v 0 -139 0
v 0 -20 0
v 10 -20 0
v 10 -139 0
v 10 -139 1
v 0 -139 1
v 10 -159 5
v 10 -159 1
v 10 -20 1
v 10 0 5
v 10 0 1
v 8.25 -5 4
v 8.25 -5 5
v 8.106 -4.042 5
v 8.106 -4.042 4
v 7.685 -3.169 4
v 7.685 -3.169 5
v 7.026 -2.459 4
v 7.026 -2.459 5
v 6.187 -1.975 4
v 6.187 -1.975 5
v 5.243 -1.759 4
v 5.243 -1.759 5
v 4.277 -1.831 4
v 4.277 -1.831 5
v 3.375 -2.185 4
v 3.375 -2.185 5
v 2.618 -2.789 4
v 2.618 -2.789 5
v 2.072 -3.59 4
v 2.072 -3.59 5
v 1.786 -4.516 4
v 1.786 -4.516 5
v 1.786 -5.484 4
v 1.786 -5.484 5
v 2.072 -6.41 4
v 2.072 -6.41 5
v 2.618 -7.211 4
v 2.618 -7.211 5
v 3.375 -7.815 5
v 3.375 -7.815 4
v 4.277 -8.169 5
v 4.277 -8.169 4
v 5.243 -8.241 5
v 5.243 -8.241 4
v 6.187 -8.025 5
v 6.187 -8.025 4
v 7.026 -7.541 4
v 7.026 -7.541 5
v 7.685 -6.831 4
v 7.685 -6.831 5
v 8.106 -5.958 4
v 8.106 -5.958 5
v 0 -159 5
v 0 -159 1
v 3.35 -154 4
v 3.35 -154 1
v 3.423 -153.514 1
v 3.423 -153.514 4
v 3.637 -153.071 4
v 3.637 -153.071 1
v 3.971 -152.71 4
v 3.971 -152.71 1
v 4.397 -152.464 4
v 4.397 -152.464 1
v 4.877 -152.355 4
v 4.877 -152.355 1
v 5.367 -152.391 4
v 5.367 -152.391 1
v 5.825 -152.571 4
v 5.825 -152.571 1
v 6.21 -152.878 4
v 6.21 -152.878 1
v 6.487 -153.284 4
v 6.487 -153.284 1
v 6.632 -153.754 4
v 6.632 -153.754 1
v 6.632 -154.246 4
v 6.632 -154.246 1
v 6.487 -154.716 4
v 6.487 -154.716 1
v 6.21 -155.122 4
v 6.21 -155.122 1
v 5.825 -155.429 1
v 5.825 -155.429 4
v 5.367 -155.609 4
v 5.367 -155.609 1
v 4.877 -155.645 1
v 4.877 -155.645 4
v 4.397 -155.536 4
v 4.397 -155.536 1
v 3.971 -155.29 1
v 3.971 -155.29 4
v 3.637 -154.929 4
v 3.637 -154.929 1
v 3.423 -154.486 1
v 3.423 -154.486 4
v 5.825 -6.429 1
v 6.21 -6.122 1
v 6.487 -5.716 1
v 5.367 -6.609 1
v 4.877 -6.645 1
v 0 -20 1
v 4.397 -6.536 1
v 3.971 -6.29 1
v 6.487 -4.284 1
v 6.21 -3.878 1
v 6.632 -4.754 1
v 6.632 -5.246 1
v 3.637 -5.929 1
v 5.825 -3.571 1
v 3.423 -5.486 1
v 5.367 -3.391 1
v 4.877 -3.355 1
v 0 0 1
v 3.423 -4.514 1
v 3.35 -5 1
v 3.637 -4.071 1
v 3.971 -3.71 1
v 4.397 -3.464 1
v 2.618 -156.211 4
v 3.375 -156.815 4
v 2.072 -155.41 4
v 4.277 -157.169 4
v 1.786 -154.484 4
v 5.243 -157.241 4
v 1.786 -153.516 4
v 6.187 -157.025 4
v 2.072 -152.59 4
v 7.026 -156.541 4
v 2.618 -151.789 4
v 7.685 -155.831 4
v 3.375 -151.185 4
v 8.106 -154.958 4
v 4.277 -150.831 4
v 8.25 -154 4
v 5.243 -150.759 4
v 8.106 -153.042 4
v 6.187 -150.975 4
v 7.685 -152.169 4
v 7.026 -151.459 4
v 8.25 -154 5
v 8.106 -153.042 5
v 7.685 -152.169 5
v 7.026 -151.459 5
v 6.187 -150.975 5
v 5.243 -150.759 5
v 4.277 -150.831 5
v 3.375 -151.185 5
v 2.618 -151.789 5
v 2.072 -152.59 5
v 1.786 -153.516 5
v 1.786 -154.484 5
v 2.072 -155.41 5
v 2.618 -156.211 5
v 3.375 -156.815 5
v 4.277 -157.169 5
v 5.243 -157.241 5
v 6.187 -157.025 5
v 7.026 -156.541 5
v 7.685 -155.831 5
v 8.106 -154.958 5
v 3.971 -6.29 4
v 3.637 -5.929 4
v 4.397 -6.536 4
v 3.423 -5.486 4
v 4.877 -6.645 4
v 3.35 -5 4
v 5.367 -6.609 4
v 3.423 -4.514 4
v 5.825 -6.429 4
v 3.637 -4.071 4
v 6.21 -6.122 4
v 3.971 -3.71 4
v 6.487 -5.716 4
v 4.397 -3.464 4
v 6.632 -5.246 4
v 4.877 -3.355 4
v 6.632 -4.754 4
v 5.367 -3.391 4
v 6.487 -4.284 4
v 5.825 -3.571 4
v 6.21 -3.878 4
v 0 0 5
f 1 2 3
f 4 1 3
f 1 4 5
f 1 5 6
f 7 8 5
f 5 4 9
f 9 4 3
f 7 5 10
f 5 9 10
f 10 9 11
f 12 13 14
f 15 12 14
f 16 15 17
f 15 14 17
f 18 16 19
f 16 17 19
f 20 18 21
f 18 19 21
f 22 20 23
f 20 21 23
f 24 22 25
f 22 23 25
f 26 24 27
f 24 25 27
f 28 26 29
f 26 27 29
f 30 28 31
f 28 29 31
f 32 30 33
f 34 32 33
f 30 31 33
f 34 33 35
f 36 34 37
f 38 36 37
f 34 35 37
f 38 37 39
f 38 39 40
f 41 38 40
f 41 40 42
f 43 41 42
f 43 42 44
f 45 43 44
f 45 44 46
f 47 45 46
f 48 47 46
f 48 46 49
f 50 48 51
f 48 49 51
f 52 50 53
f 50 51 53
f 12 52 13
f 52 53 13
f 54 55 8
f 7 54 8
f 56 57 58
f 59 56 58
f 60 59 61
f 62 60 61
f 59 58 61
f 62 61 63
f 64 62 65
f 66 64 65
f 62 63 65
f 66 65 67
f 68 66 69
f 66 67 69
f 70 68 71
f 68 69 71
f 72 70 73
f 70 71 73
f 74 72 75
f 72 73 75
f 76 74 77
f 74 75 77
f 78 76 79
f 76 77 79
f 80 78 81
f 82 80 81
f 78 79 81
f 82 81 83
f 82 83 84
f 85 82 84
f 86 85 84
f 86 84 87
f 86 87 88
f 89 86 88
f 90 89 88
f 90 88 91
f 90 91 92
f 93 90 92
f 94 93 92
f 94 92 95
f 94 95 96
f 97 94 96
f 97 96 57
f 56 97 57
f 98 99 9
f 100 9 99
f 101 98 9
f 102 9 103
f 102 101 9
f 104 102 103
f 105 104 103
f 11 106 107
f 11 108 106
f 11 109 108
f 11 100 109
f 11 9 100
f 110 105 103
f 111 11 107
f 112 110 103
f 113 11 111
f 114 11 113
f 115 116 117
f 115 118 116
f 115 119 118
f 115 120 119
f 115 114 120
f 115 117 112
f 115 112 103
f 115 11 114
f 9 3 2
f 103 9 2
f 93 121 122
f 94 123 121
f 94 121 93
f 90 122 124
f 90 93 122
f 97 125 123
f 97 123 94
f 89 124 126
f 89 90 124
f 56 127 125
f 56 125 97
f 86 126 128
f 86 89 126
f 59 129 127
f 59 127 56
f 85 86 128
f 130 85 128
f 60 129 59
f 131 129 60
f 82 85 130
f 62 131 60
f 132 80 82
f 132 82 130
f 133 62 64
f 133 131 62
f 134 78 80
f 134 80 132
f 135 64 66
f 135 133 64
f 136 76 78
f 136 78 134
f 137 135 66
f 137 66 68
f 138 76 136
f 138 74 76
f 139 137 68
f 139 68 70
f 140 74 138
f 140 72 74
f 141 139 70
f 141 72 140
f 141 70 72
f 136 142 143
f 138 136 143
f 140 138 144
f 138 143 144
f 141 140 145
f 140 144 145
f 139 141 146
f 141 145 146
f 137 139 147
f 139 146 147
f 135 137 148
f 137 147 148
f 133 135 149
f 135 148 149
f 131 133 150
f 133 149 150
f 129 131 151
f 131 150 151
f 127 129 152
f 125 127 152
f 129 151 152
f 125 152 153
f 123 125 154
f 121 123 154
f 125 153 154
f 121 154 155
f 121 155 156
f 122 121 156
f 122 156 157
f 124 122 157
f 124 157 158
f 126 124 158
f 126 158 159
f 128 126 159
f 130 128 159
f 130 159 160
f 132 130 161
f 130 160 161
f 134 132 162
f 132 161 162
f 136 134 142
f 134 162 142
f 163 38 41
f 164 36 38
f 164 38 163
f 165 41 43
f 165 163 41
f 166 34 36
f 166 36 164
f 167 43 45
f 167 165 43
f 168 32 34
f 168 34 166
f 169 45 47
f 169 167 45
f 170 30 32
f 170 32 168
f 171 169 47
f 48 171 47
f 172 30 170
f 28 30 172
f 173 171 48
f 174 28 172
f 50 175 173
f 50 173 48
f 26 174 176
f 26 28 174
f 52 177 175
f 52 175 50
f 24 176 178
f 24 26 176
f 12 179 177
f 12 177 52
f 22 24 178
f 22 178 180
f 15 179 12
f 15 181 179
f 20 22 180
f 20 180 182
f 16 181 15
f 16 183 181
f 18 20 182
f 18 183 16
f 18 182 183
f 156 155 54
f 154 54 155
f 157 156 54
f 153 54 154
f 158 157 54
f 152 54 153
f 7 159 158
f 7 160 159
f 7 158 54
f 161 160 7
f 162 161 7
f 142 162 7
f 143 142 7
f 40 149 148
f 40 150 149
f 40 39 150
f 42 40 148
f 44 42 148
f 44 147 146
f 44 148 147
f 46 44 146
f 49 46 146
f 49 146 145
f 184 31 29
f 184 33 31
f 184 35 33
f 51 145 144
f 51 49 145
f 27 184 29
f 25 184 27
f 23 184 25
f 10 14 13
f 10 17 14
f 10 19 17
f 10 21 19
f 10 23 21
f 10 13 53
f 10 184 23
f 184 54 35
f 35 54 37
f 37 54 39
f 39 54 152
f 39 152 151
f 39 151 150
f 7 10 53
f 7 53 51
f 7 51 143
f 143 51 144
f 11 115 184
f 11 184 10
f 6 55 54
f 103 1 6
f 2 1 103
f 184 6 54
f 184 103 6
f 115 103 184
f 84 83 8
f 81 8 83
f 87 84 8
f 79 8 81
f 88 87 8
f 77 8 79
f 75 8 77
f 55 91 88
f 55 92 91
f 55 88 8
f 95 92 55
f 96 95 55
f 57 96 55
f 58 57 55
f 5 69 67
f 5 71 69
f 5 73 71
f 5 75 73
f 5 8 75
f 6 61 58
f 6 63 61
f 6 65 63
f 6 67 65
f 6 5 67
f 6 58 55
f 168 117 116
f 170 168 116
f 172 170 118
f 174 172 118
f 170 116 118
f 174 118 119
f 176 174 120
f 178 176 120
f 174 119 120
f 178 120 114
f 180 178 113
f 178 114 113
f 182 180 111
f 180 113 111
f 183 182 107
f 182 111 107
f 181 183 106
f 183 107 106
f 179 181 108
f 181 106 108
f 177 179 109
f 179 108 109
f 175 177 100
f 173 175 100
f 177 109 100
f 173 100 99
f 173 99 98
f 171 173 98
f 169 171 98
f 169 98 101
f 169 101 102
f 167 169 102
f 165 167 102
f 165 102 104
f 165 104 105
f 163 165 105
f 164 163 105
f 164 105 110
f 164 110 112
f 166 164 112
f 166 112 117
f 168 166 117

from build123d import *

# Parameters (mm, degrees)
SKETCH_1_W          = 10
SKETCH_1_H          = 159
EXTRUDE_1_DEPTH     = 5
SKETCH_3_W          = 10
SKETCH_3_H          = 20
CUT_EXTRUDE_1_DEPTH = 1
HOLE_WIZARD_M4_1_D  = 3.3
SKETCH_7_R          = 3.25
CUT_EXTRUDE_2_DEPTH = 1


with BuildPart() as part:
    # 草图1 → 凸台-拉伸1 (new body)
    with BuildSketch(Plane.XY):
        with Locations((5, -79.5)):
            Rectangle(SKETCH_1_W, SKETCH_1_H)
    extrude(amount=EXTRUDE_1_DEPTH)

    # 草图3 → 切除-拉伸1 (cut)
    with BuildSketch(Plane(origin=(0, 0, 0), x_dir=(-1, 0, 0), z_dir=(0, 0, -1))):
        with Locations((-5, -10)):
            Rectangle(SKETCH_3_W, SKETCH_3_H)
        with Locations((-5, -149)):
            Rectangle(SKETCH_3_W, SKETCH_3_H)
    extrude(amount=-CUT_EXTRUDE_1_DEPTH, mode=Mode.SUBTRACT)

    # M4 螺纹孔的螺纹孔钻头1 (through all)
    with Locations(Plane.XY.offset(5)):
        with Locations((5, -5), (5, -154)):
            Hole(HOLE_WIZARD_M4_1_D / 2)

    # 草图7 → 切除-拉伸2 (cut)
    with BuildSketch(Plane.XY.offset(5)):
        with Locations((5, -5)):
            Circle(SKETCH_7_R)
        with Locations((5, -154)):
            Circle(SKETCH_7_R)
    extrude(amount=-CUT_EXTRUDE_2_DEPTH, mode=Mode.SUBTRACT)


solid = part.part
